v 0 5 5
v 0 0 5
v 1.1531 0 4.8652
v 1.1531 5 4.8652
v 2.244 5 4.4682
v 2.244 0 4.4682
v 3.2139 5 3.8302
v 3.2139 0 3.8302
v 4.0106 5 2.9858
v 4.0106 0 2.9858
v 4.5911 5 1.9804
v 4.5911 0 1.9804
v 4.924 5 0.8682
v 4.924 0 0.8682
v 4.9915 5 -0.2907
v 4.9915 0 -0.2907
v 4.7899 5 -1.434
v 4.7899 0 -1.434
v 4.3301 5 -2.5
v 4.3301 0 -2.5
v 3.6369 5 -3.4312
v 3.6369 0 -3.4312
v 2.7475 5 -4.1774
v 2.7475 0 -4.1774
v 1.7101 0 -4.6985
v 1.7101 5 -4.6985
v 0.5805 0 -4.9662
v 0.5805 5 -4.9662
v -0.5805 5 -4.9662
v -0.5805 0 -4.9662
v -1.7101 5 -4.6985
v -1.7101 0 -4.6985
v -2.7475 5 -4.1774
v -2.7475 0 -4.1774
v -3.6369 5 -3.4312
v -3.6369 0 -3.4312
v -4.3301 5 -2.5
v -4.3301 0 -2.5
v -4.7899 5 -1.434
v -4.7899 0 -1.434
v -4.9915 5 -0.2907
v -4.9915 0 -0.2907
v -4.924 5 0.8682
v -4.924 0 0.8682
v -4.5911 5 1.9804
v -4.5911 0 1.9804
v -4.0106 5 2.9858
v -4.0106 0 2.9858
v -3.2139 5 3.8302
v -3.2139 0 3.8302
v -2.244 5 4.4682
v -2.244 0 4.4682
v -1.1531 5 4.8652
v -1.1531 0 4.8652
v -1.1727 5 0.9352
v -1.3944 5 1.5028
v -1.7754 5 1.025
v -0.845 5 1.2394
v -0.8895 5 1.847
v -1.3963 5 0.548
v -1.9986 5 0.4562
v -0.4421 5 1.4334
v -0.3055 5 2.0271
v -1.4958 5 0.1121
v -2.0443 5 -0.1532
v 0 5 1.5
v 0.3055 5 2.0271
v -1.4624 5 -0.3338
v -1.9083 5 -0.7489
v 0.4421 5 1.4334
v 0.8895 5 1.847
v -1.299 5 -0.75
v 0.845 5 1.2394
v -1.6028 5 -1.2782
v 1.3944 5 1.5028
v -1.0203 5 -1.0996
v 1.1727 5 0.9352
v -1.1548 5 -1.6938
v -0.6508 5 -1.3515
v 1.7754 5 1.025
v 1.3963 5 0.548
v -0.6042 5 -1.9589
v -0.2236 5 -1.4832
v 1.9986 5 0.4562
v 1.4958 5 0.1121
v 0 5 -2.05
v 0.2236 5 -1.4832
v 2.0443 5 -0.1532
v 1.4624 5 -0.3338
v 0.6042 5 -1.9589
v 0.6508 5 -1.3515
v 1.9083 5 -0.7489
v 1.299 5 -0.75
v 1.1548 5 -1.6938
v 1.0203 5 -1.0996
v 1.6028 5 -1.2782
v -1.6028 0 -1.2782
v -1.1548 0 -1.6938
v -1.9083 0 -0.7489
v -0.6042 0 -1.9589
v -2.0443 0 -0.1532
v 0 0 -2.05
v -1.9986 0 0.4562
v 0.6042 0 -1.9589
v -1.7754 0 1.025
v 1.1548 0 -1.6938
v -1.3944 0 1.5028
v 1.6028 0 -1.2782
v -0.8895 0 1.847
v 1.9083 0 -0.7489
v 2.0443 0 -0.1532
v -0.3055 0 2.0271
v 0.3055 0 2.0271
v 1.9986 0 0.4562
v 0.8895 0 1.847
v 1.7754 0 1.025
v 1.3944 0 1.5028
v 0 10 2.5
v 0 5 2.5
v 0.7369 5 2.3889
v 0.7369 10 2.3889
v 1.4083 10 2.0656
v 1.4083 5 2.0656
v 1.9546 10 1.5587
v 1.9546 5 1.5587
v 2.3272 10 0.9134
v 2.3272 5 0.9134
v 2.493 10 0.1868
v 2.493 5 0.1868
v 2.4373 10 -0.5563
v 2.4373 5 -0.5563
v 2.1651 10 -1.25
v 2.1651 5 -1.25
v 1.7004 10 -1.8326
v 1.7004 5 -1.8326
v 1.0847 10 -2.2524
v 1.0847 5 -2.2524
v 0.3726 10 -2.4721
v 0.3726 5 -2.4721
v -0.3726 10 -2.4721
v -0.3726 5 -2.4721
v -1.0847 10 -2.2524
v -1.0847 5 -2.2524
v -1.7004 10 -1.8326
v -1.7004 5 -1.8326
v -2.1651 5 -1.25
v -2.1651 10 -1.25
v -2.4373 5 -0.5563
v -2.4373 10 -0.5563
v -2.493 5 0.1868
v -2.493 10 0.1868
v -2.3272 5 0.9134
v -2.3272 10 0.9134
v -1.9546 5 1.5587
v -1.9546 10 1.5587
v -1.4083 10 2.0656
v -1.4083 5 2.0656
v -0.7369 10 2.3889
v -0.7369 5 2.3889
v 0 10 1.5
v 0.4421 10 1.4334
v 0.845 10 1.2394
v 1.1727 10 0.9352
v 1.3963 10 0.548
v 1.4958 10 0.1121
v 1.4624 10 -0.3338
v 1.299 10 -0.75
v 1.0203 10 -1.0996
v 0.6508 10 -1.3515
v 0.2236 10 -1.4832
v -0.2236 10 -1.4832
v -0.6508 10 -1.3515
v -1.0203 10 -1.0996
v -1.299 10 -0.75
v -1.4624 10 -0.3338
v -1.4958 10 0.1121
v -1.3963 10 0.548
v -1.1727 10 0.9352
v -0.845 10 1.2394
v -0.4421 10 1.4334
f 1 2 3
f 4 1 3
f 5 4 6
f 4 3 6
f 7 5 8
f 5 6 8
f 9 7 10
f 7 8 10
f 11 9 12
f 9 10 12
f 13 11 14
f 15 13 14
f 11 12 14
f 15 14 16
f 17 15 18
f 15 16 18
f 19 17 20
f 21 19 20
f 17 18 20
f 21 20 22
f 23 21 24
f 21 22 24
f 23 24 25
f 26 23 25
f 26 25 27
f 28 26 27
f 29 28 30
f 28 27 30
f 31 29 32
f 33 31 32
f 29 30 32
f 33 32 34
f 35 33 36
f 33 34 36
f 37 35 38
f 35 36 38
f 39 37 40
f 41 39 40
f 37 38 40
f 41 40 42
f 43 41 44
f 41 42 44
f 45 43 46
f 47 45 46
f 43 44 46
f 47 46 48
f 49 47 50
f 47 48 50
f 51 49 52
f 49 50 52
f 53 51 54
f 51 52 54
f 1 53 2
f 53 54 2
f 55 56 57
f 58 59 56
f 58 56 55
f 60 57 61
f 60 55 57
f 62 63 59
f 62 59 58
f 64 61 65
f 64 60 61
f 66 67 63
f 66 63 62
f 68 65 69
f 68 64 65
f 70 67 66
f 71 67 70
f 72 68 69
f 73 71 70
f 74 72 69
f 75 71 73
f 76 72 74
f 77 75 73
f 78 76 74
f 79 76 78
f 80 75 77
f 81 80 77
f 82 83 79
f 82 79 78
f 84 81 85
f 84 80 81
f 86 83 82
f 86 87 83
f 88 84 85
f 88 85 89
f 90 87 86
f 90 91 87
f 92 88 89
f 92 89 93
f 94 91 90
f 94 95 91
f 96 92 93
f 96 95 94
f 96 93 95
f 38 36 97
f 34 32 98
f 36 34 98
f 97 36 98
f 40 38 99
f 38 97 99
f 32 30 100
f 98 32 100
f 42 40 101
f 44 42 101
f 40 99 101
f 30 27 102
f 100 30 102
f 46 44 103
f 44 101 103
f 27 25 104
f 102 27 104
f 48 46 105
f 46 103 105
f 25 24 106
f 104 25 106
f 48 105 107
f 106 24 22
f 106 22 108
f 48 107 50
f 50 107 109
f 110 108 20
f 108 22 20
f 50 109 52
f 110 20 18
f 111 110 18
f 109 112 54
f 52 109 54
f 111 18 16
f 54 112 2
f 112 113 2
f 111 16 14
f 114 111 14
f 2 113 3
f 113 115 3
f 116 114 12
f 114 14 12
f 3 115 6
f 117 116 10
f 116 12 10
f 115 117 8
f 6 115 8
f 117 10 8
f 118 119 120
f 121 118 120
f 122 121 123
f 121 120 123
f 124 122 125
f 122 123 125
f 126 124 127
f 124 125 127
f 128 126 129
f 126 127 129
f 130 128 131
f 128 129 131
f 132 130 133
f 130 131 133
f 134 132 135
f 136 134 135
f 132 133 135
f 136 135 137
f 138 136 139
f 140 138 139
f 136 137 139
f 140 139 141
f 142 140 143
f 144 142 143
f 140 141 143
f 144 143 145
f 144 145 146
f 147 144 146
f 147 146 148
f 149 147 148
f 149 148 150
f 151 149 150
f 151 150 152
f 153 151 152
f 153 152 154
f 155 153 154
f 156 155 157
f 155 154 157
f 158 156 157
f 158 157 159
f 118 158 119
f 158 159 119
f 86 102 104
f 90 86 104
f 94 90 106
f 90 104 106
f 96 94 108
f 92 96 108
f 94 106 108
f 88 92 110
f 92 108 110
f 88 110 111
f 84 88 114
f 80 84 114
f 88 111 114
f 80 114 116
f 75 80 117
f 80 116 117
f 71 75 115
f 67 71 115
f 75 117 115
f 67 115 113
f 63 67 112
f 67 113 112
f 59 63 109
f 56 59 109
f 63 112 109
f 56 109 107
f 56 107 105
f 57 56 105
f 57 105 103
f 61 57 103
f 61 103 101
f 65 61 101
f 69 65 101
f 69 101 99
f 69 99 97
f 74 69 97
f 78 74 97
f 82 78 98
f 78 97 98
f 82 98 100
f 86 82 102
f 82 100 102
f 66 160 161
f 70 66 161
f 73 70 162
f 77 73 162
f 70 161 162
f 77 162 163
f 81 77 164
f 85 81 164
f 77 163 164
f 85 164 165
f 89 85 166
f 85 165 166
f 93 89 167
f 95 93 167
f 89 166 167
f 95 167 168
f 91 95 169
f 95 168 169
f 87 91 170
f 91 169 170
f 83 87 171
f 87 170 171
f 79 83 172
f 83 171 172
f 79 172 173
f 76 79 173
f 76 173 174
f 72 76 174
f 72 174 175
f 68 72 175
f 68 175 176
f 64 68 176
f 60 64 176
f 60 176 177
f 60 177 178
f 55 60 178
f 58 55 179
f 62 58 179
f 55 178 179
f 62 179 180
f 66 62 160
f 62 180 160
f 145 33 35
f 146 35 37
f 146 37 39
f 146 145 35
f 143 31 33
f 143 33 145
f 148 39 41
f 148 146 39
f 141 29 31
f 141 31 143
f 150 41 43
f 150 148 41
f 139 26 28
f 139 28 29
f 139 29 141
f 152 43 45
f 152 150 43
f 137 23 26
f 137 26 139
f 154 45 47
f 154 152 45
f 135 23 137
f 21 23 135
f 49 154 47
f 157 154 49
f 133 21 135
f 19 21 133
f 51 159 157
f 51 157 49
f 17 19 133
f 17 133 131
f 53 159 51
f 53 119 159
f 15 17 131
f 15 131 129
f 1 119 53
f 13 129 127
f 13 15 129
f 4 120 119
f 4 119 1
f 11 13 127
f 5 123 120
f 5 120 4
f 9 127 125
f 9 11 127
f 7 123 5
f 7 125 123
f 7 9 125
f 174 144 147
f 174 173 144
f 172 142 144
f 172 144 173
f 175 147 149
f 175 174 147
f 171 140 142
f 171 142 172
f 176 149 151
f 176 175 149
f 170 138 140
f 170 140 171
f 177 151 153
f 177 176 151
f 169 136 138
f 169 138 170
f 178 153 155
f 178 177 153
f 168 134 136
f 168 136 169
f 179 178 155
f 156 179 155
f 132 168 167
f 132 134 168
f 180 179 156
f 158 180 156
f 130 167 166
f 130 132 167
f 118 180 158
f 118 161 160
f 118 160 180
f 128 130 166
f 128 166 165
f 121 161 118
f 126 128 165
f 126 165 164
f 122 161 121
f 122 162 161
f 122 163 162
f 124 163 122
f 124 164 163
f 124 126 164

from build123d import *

# Parameters (mm, degrees)
ESQUISSE1_R             = 5
BOSS_EXTRU_1_DEPTH      = 5
ESQUISSE2_R             = 2.5
BOSS_EXTRU_2_DEPTH      = 5
ESQUISSE3_R             = 1.5
ENL_V_MAT_EXTRU_2_DEPTH = 5
ESQUISSE4_R             = 2.05
ENL_V_MAT_EXTRU_3_DEPTH = 5


with BuildPart() as part:
    # Esquisse1 → Boss.-Extru.1 (new body)
    with BuildSketch(Plane(origin=(0, 0, 0), x_dir=(1, 0, 0), z_dir=(0, 1, 0))):
        with Locations(Location((0, 0, 0), (0, 0, 270))):
            Circle(ESQUISSE1_R)
    extrude(amount=BOSS_EXTRU_1_DEPTH)

    # Esquisse2 → Boss.-Extru.2 (add)
    with BuildSketch(Plane(origin=(0, 5, 0), x_dir=(1, 0, 0), z_dir=(0, 1, 0))):
        with Locations(Location((0, 0, 0), (0, 0, 270))):
            Circle(ESQUISSE2_R)
    extrude(amount=BOSS_EXTRU_2_DEPTH)

    # Esquisse3 → Enlèv. mat.-Extru.2 (cut)
    with BuildSketch(Plane(origin=(0, 10, 0), x_dir=(1, 0, 0), z_dir=(0, 1, 0))):
        with Locations(Location((0, 0, 0), (0, 0, 270))):
            Circle(ESQUISSE3_R)
    extrude(amount=-ENL_V_MAT_EXTRU_2_DEPTH, mode=Mode.SUBTRACT)

    # Esquisse4 → Enlèv. mat.-Extru.3 (cut)
    with BuildSketch(Plane.XZ):
        with Locations(Location((0, 0, 0), (0, 0, 270))):
            Circle(ESQUISSE4_R)
    extrude(amount=-ENL_V_MAT_EXTRU_3_DEPTH, mode=Mode.SUBTRACT)


solid = part.part
